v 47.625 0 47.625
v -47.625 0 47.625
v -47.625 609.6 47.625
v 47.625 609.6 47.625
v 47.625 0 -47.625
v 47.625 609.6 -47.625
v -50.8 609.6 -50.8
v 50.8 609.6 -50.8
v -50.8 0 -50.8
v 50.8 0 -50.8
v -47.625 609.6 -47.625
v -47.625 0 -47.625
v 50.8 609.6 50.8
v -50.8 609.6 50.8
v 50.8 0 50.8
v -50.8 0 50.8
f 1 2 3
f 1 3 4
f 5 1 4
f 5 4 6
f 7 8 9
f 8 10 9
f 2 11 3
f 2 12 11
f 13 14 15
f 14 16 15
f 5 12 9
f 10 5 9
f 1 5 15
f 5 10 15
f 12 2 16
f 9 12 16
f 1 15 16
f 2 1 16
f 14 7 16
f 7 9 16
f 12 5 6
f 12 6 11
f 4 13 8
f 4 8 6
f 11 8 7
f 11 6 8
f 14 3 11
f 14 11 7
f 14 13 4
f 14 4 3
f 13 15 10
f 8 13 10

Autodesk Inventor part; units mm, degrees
ref_plane "YZ Plane" through (0, 0, 0) normal (1, 0, 0) x (0, 1, 0)
ref_plane "XZ Plane" through (0, 0, 0) normal (0, 1, 0) x (-1, 0, 0)
ref_plane "XY Plane" through (0, 0, 0) normal (0, 0, 1) x (1, 0, 0)
sketch "Sketch1" plane through (0, 0, 0) normal (0, 1, 0) x (-1, 0, 0)
  line L0 (-50.8, 50.8) -> (-50.8, -50.8)
  line L1 (-50.8, -50.8) -> (50.8, -50.8)
  line L2 (50.8, -50.8) -> (50.8, 50.8)
  line L3 (50.8, 50.8) -> (-50.8, 50.8)
  line L4 (-50.8, 50.8) -> (50.8, -50.8) construction
  line L5 (-50.8, -50.8) -> (50.8, 50.8) construction
  line L6 (-47.625, 47.625) -> (-47.625, -47.625)
  line L7 (-47.625, -47.625) -> (47.625, -47.625)
  line L8 (47.625, -47.625) -> (47.625, 47.625)
  line L9 (47.625, 47.625) -> (-47.625, 47.625)
  line L10 (-47.625, 47.625) -> (47.625, -47.625) construction
  line L11 (-47.625, -47.625) -> (47.625, 47.625) construction
  point P0 (0, 0)
  dimension "d0" = 101.6
  dimension "d1" = 3.175
extrude "Extrusion1" add sketch "Sketch1" along normal blind 609.6
properties part number "AlumPost-4x4x36-1_8" material "Aluminum 6061"
